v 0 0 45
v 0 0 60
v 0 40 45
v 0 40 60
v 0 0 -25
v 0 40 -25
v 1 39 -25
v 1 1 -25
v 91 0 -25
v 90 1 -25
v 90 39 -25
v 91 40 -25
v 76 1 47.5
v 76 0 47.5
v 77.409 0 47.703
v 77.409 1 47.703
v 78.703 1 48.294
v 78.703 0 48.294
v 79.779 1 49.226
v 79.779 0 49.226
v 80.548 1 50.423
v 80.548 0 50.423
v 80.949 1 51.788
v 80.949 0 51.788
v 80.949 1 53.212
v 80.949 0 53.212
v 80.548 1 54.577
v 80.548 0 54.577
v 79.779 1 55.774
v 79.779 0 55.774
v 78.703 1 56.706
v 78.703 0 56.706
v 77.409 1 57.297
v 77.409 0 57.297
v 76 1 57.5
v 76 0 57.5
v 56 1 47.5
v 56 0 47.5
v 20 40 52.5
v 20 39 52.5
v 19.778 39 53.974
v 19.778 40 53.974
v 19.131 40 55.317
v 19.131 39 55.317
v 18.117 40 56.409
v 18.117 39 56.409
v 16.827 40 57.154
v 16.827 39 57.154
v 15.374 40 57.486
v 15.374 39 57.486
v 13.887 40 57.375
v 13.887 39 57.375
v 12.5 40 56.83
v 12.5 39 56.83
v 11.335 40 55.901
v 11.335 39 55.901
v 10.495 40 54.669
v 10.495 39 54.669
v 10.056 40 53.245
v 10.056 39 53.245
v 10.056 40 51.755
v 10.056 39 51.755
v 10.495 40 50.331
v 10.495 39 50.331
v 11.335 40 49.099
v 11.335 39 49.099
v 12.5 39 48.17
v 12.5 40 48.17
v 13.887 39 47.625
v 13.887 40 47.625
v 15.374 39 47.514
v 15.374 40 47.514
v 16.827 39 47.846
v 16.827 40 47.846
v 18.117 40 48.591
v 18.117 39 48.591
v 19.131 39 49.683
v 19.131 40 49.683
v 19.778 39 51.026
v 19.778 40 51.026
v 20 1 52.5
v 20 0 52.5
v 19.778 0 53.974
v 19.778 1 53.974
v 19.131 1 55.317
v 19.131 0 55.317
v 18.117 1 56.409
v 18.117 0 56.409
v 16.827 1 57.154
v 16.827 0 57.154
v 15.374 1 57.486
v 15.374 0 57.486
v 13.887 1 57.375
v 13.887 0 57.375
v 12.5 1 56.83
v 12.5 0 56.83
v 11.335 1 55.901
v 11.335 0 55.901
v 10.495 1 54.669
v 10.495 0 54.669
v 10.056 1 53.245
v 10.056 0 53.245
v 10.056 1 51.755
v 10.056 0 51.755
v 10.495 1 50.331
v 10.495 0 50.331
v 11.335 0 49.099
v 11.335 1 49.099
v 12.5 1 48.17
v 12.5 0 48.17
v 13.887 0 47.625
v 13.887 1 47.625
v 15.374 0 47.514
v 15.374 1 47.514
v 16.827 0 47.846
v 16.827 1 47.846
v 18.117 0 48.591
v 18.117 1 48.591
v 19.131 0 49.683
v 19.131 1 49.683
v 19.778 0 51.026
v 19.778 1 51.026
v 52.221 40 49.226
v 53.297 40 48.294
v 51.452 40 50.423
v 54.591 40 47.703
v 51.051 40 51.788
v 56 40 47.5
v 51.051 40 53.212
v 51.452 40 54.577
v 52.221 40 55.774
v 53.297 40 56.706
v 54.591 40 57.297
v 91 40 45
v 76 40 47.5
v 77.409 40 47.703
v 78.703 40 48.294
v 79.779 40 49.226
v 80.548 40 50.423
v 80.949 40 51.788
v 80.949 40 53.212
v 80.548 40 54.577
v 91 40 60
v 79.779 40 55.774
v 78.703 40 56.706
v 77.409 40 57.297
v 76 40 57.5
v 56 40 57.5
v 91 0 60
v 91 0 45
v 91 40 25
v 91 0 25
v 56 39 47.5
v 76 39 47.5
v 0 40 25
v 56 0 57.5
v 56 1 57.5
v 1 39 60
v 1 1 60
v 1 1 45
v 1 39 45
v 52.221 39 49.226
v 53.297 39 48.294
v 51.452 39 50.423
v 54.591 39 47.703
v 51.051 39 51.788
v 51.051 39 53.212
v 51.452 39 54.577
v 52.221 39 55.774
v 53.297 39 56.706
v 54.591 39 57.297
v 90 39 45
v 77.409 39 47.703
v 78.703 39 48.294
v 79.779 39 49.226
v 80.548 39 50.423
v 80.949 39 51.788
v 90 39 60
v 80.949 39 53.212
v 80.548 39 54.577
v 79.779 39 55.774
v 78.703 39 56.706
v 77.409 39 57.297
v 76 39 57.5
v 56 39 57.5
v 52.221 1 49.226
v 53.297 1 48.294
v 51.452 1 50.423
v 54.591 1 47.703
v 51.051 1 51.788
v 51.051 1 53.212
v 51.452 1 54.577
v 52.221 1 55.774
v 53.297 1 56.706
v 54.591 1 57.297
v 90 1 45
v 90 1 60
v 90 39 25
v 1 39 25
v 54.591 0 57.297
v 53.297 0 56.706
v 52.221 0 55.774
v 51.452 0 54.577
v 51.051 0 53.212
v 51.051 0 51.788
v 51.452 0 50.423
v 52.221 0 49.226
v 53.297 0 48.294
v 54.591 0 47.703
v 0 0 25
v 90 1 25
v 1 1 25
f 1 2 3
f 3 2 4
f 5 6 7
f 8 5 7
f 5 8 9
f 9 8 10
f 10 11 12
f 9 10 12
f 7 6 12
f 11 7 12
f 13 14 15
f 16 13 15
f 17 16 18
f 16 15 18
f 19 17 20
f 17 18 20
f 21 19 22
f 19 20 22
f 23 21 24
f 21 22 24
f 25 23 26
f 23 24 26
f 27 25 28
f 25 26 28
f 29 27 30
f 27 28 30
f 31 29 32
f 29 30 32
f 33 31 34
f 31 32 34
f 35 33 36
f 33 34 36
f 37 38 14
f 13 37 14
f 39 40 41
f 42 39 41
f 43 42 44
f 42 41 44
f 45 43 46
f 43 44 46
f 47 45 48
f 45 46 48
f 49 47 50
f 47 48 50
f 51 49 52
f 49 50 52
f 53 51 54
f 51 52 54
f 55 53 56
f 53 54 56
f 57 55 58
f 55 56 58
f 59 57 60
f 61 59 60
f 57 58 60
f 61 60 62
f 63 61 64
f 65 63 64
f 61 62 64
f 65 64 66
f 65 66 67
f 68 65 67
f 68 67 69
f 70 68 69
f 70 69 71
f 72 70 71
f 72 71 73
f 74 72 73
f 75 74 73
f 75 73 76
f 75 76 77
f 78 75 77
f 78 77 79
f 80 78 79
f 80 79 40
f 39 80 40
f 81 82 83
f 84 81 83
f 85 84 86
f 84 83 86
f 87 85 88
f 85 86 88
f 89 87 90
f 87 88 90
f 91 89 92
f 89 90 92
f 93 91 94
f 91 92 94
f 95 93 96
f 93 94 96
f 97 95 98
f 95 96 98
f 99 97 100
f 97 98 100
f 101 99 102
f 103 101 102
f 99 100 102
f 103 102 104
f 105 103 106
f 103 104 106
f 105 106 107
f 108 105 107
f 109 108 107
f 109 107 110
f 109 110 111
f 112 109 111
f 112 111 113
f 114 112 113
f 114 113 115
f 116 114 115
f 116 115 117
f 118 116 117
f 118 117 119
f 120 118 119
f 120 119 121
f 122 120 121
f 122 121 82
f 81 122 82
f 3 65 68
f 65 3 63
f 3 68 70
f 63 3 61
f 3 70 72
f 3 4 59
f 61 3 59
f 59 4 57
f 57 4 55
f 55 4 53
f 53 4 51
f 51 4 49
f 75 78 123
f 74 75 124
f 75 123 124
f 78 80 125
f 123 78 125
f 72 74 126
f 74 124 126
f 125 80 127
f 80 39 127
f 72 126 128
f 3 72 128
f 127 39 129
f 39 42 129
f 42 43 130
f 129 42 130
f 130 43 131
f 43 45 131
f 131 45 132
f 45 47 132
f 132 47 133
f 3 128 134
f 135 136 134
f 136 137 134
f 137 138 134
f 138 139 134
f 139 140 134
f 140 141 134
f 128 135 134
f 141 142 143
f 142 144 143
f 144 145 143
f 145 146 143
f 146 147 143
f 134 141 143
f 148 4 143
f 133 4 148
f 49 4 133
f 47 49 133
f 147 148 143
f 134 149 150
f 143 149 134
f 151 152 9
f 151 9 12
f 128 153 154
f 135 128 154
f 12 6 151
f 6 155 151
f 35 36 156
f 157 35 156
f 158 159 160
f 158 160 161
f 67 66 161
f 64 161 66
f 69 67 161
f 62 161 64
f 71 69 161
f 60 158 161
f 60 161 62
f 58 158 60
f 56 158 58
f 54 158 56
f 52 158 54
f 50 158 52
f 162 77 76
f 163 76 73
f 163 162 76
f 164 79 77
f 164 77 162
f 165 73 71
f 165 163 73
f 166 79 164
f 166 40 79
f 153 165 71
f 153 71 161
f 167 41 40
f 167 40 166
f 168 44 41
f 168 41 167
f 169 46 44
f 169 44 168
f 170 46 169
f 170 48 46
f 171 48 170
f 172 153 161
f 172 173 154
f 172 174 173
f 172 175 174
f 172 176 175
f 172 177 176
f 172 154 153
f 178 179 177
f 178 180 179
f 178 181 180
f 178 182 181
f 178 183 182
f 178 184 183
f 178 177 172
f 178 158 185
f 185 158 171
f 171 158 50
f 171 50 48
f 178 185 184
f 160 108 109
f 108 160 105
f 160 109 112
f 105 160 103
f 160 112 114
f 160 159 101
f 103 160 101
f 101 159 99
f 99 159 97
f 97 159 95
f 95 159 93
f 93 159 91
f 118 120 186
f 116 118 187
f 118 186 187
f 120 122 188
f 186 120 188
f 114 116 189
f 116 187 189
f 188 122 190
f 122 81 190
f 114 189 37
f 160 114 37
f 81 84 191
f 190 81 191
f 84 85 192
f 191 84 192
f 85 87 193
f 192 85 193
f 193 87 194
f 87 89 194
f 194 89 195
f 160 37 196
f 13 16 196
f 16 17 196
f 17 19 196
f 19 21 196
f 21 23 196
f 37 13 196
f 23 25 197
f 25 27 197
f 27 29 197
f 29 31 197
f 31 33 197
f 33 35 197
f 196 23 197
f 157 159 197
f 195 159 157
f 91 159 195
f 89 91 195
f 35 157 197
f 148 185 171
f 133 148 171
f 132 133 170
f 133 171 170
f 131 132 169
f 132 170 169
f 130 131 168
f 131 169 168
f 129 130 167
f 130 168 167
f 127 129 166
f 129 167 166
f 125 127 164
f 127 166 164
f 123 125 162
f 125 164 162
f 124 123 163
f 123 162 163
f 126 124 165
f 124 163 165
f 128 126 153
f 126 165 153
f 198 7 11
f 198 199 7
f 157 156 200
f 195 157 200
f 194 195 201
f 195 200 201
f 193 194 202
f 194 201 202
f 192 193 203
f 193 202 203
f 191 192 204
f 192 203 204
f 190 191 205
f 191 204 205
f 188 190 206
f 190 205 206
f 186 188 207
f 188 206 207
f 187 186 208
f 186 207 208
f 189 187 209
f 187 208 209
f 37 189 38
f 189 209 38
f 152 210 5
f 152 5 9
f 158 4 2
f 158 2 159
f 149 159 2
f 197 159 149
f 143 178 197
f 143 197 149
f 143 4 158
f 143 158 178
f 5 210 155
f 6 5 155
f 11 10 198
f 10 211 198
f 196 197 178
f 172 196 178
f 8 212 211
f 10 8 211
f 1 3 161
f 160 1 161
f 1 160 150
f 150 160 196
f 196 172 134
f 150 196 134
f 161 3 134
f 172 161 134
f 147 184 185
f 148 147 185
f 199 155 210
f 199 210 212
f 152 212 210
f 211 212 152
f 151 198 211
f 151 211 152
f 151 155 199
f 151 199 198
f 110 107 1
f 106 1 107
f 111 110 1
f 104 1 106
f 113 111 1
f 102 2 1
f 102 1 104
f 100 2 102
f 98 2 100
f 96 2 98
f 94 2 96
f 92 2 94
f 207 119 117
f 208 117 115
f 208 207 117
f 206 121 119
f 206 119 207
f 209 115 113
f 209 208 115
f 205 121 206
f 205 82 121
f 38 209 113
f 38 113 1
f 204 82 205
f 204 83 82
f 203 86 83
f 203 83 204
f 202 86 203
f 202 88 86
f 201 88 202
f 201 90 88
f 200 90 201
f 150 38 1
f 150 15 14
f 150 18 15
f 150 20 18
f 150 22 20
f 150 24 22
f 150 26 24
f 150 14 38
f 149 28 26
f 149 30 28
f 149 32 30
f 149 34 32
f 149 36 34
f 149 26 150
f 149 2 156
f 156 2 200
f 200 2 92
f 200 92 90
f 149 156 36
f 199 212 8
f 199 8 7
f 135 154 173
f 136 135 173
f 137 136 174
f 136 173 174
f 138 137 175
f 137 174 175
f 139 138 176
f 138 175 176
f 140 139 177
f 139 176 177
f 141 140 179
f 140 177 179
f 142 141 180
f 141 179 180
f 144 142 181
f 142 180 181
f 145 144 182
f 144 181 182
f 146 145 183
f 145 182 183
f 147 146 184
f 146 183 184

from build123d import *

# Parameters (mm, degrees)
F0_W      = 91
F0_H      = 40
F1_DEPTH  = 25
F2_W      = 89
F2_H      = 38
F3_DEPTH  = 25
F4_W      = 91
F4_H      = 40
F4_W_2    = 89
F4_H_2    = 38
F5_DEPTH  = 25
F7_W      = 91
F7_H      = 40
F7_W_2    = 89
F7_H_2    = 38
F8_DEPTH  = 15
F9_R      = 5
F10_DEPTH = 40.001


with BuildPart() as f1:
    # F0 (on Top) → F1 (new body)
    with BuildSketch(Plane.XY):
        with Locations((45.5, 20)):
            Rectangle(F0_W, F0_H)
    extrude(amount=F1_DEPTH)

    # F2 (on face) → F3 (cut)
    with BuildSketch(Plane.XY.offset(25)):
        with Locations((45.5, 20)):
            Rectangle(F2_W, F2_H)
    extrude(amount=-F3_DEPTH, mode=Mode.SUBTRACT)

    # F4 (on Top) → F5 (join)
    with BuildSketch(Plane.XY):
        with Locations((45.5, 20)):
            Rectangle(F4_W, F4_H)
        with Locations((45.5, 20)):
            Rectangle(F4_W_2, F4_H_2, mode=Mode.SUBTRACT)
    extrude(amount=-F5_DEPTH)


with BuildPart() as f8:
    # F7 (on offset) → F8 (new body)
    with BuildSketch(Plane.XY.offset(60)):
        with Locations((45.5, 20)):
            Rectangle(F7_W, F7_H)
        with Locations((45.5, 20)):
            Rectangle(F7_W_2, F7_H_2, mode=Mode.SUBTRACT)
    extrude(amount=-F8_DEPTH)

    # F9 (on face) → F10 (cut, through all)
    with BuildSketch(Plane.XZ):
        with Locations((15, 52.5)):
            Circle(F9_R)
        with BuildLine():
            Line((76, 57.5), (56, 57.5))
            ThreePointArc((56, 57.5), (51, 52.5), (56, 47.5))
            Line((56, 47.5), (76, 47.5))
            ThreePointArc((76, 47.5), (81, 52.5), (76, 57.5))
        make_face()
    extrude(amount=-F10_DEPTH, mode=Mode.SUBTRACT)


solid = Compound([f1.part, f8.part])
